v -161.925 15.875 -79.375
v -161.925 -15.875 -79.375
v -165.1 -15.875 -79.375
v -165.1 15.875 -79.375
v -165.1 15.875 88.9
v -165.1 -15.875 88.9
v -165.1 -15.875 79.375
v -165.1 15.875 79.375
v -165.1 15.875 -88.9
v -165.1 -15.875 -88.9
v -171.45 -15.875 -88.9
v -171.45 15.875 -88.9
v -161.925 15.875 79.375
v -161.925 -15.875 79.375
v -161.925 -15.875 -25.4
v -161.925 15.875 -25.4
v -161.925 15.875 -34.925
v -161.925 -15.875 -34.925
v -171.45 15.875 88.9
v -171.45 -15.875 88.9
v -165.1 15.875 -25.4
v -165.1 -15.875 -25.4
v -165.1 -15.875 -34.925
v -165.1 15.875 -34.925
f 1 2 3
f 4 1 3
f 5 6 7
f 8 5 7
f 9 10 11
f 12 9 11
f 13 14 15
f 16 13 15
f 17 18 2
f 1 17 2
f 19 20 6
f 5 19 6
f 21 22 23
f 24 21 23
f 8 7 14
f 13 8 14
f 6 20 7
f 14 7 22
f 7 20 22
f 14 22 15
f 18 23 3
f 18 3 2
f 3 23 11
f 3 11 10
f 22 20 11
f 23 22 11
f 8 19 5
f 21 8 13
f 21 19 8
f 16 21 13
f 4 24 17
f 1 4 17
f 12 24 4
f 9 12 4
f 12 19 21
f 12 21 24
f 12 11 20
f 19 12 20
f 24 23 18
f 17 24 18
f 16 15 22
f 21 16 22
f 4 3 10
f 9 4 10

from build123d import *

# Parameters (mm, degrees)
BOSS_EXTRUDE1_DEPTH      = 15.875
BOSS_EXTRUDE1_DEPTH_BACK = 15.875


with BuildPart() as part:
    # Sketch2 → Boss-Extrude1 (new, two sides: drawn at the far end of the back side and taken through both)
    with BuildSketch(Plane(origin=(0, 0, 0), x_dir=(1, 0, 0), z_dir=(0, 1, 0)).offset(-BOSS_EXTRUDE1_DEPTH_BACK)):
        Polygon((-171.45, 88.9), (-171.45, -88.9), (-165.1, -88.9), (-165.1, -79.375), (-161.925, -79.375), (-161.925, 25.4), (-165.1, 25.4), (-165.1, 34.925), (-161.925, 34.925), (-161.925, 79.375), (-165.1, 79.375), (-165.1, 88.9), align=None)
    extrude(amount=BOSS_EXTRUDE1_DEPTH + BOSS_EXTRUDE1_DEPTH_BACK)


solid = part.part
